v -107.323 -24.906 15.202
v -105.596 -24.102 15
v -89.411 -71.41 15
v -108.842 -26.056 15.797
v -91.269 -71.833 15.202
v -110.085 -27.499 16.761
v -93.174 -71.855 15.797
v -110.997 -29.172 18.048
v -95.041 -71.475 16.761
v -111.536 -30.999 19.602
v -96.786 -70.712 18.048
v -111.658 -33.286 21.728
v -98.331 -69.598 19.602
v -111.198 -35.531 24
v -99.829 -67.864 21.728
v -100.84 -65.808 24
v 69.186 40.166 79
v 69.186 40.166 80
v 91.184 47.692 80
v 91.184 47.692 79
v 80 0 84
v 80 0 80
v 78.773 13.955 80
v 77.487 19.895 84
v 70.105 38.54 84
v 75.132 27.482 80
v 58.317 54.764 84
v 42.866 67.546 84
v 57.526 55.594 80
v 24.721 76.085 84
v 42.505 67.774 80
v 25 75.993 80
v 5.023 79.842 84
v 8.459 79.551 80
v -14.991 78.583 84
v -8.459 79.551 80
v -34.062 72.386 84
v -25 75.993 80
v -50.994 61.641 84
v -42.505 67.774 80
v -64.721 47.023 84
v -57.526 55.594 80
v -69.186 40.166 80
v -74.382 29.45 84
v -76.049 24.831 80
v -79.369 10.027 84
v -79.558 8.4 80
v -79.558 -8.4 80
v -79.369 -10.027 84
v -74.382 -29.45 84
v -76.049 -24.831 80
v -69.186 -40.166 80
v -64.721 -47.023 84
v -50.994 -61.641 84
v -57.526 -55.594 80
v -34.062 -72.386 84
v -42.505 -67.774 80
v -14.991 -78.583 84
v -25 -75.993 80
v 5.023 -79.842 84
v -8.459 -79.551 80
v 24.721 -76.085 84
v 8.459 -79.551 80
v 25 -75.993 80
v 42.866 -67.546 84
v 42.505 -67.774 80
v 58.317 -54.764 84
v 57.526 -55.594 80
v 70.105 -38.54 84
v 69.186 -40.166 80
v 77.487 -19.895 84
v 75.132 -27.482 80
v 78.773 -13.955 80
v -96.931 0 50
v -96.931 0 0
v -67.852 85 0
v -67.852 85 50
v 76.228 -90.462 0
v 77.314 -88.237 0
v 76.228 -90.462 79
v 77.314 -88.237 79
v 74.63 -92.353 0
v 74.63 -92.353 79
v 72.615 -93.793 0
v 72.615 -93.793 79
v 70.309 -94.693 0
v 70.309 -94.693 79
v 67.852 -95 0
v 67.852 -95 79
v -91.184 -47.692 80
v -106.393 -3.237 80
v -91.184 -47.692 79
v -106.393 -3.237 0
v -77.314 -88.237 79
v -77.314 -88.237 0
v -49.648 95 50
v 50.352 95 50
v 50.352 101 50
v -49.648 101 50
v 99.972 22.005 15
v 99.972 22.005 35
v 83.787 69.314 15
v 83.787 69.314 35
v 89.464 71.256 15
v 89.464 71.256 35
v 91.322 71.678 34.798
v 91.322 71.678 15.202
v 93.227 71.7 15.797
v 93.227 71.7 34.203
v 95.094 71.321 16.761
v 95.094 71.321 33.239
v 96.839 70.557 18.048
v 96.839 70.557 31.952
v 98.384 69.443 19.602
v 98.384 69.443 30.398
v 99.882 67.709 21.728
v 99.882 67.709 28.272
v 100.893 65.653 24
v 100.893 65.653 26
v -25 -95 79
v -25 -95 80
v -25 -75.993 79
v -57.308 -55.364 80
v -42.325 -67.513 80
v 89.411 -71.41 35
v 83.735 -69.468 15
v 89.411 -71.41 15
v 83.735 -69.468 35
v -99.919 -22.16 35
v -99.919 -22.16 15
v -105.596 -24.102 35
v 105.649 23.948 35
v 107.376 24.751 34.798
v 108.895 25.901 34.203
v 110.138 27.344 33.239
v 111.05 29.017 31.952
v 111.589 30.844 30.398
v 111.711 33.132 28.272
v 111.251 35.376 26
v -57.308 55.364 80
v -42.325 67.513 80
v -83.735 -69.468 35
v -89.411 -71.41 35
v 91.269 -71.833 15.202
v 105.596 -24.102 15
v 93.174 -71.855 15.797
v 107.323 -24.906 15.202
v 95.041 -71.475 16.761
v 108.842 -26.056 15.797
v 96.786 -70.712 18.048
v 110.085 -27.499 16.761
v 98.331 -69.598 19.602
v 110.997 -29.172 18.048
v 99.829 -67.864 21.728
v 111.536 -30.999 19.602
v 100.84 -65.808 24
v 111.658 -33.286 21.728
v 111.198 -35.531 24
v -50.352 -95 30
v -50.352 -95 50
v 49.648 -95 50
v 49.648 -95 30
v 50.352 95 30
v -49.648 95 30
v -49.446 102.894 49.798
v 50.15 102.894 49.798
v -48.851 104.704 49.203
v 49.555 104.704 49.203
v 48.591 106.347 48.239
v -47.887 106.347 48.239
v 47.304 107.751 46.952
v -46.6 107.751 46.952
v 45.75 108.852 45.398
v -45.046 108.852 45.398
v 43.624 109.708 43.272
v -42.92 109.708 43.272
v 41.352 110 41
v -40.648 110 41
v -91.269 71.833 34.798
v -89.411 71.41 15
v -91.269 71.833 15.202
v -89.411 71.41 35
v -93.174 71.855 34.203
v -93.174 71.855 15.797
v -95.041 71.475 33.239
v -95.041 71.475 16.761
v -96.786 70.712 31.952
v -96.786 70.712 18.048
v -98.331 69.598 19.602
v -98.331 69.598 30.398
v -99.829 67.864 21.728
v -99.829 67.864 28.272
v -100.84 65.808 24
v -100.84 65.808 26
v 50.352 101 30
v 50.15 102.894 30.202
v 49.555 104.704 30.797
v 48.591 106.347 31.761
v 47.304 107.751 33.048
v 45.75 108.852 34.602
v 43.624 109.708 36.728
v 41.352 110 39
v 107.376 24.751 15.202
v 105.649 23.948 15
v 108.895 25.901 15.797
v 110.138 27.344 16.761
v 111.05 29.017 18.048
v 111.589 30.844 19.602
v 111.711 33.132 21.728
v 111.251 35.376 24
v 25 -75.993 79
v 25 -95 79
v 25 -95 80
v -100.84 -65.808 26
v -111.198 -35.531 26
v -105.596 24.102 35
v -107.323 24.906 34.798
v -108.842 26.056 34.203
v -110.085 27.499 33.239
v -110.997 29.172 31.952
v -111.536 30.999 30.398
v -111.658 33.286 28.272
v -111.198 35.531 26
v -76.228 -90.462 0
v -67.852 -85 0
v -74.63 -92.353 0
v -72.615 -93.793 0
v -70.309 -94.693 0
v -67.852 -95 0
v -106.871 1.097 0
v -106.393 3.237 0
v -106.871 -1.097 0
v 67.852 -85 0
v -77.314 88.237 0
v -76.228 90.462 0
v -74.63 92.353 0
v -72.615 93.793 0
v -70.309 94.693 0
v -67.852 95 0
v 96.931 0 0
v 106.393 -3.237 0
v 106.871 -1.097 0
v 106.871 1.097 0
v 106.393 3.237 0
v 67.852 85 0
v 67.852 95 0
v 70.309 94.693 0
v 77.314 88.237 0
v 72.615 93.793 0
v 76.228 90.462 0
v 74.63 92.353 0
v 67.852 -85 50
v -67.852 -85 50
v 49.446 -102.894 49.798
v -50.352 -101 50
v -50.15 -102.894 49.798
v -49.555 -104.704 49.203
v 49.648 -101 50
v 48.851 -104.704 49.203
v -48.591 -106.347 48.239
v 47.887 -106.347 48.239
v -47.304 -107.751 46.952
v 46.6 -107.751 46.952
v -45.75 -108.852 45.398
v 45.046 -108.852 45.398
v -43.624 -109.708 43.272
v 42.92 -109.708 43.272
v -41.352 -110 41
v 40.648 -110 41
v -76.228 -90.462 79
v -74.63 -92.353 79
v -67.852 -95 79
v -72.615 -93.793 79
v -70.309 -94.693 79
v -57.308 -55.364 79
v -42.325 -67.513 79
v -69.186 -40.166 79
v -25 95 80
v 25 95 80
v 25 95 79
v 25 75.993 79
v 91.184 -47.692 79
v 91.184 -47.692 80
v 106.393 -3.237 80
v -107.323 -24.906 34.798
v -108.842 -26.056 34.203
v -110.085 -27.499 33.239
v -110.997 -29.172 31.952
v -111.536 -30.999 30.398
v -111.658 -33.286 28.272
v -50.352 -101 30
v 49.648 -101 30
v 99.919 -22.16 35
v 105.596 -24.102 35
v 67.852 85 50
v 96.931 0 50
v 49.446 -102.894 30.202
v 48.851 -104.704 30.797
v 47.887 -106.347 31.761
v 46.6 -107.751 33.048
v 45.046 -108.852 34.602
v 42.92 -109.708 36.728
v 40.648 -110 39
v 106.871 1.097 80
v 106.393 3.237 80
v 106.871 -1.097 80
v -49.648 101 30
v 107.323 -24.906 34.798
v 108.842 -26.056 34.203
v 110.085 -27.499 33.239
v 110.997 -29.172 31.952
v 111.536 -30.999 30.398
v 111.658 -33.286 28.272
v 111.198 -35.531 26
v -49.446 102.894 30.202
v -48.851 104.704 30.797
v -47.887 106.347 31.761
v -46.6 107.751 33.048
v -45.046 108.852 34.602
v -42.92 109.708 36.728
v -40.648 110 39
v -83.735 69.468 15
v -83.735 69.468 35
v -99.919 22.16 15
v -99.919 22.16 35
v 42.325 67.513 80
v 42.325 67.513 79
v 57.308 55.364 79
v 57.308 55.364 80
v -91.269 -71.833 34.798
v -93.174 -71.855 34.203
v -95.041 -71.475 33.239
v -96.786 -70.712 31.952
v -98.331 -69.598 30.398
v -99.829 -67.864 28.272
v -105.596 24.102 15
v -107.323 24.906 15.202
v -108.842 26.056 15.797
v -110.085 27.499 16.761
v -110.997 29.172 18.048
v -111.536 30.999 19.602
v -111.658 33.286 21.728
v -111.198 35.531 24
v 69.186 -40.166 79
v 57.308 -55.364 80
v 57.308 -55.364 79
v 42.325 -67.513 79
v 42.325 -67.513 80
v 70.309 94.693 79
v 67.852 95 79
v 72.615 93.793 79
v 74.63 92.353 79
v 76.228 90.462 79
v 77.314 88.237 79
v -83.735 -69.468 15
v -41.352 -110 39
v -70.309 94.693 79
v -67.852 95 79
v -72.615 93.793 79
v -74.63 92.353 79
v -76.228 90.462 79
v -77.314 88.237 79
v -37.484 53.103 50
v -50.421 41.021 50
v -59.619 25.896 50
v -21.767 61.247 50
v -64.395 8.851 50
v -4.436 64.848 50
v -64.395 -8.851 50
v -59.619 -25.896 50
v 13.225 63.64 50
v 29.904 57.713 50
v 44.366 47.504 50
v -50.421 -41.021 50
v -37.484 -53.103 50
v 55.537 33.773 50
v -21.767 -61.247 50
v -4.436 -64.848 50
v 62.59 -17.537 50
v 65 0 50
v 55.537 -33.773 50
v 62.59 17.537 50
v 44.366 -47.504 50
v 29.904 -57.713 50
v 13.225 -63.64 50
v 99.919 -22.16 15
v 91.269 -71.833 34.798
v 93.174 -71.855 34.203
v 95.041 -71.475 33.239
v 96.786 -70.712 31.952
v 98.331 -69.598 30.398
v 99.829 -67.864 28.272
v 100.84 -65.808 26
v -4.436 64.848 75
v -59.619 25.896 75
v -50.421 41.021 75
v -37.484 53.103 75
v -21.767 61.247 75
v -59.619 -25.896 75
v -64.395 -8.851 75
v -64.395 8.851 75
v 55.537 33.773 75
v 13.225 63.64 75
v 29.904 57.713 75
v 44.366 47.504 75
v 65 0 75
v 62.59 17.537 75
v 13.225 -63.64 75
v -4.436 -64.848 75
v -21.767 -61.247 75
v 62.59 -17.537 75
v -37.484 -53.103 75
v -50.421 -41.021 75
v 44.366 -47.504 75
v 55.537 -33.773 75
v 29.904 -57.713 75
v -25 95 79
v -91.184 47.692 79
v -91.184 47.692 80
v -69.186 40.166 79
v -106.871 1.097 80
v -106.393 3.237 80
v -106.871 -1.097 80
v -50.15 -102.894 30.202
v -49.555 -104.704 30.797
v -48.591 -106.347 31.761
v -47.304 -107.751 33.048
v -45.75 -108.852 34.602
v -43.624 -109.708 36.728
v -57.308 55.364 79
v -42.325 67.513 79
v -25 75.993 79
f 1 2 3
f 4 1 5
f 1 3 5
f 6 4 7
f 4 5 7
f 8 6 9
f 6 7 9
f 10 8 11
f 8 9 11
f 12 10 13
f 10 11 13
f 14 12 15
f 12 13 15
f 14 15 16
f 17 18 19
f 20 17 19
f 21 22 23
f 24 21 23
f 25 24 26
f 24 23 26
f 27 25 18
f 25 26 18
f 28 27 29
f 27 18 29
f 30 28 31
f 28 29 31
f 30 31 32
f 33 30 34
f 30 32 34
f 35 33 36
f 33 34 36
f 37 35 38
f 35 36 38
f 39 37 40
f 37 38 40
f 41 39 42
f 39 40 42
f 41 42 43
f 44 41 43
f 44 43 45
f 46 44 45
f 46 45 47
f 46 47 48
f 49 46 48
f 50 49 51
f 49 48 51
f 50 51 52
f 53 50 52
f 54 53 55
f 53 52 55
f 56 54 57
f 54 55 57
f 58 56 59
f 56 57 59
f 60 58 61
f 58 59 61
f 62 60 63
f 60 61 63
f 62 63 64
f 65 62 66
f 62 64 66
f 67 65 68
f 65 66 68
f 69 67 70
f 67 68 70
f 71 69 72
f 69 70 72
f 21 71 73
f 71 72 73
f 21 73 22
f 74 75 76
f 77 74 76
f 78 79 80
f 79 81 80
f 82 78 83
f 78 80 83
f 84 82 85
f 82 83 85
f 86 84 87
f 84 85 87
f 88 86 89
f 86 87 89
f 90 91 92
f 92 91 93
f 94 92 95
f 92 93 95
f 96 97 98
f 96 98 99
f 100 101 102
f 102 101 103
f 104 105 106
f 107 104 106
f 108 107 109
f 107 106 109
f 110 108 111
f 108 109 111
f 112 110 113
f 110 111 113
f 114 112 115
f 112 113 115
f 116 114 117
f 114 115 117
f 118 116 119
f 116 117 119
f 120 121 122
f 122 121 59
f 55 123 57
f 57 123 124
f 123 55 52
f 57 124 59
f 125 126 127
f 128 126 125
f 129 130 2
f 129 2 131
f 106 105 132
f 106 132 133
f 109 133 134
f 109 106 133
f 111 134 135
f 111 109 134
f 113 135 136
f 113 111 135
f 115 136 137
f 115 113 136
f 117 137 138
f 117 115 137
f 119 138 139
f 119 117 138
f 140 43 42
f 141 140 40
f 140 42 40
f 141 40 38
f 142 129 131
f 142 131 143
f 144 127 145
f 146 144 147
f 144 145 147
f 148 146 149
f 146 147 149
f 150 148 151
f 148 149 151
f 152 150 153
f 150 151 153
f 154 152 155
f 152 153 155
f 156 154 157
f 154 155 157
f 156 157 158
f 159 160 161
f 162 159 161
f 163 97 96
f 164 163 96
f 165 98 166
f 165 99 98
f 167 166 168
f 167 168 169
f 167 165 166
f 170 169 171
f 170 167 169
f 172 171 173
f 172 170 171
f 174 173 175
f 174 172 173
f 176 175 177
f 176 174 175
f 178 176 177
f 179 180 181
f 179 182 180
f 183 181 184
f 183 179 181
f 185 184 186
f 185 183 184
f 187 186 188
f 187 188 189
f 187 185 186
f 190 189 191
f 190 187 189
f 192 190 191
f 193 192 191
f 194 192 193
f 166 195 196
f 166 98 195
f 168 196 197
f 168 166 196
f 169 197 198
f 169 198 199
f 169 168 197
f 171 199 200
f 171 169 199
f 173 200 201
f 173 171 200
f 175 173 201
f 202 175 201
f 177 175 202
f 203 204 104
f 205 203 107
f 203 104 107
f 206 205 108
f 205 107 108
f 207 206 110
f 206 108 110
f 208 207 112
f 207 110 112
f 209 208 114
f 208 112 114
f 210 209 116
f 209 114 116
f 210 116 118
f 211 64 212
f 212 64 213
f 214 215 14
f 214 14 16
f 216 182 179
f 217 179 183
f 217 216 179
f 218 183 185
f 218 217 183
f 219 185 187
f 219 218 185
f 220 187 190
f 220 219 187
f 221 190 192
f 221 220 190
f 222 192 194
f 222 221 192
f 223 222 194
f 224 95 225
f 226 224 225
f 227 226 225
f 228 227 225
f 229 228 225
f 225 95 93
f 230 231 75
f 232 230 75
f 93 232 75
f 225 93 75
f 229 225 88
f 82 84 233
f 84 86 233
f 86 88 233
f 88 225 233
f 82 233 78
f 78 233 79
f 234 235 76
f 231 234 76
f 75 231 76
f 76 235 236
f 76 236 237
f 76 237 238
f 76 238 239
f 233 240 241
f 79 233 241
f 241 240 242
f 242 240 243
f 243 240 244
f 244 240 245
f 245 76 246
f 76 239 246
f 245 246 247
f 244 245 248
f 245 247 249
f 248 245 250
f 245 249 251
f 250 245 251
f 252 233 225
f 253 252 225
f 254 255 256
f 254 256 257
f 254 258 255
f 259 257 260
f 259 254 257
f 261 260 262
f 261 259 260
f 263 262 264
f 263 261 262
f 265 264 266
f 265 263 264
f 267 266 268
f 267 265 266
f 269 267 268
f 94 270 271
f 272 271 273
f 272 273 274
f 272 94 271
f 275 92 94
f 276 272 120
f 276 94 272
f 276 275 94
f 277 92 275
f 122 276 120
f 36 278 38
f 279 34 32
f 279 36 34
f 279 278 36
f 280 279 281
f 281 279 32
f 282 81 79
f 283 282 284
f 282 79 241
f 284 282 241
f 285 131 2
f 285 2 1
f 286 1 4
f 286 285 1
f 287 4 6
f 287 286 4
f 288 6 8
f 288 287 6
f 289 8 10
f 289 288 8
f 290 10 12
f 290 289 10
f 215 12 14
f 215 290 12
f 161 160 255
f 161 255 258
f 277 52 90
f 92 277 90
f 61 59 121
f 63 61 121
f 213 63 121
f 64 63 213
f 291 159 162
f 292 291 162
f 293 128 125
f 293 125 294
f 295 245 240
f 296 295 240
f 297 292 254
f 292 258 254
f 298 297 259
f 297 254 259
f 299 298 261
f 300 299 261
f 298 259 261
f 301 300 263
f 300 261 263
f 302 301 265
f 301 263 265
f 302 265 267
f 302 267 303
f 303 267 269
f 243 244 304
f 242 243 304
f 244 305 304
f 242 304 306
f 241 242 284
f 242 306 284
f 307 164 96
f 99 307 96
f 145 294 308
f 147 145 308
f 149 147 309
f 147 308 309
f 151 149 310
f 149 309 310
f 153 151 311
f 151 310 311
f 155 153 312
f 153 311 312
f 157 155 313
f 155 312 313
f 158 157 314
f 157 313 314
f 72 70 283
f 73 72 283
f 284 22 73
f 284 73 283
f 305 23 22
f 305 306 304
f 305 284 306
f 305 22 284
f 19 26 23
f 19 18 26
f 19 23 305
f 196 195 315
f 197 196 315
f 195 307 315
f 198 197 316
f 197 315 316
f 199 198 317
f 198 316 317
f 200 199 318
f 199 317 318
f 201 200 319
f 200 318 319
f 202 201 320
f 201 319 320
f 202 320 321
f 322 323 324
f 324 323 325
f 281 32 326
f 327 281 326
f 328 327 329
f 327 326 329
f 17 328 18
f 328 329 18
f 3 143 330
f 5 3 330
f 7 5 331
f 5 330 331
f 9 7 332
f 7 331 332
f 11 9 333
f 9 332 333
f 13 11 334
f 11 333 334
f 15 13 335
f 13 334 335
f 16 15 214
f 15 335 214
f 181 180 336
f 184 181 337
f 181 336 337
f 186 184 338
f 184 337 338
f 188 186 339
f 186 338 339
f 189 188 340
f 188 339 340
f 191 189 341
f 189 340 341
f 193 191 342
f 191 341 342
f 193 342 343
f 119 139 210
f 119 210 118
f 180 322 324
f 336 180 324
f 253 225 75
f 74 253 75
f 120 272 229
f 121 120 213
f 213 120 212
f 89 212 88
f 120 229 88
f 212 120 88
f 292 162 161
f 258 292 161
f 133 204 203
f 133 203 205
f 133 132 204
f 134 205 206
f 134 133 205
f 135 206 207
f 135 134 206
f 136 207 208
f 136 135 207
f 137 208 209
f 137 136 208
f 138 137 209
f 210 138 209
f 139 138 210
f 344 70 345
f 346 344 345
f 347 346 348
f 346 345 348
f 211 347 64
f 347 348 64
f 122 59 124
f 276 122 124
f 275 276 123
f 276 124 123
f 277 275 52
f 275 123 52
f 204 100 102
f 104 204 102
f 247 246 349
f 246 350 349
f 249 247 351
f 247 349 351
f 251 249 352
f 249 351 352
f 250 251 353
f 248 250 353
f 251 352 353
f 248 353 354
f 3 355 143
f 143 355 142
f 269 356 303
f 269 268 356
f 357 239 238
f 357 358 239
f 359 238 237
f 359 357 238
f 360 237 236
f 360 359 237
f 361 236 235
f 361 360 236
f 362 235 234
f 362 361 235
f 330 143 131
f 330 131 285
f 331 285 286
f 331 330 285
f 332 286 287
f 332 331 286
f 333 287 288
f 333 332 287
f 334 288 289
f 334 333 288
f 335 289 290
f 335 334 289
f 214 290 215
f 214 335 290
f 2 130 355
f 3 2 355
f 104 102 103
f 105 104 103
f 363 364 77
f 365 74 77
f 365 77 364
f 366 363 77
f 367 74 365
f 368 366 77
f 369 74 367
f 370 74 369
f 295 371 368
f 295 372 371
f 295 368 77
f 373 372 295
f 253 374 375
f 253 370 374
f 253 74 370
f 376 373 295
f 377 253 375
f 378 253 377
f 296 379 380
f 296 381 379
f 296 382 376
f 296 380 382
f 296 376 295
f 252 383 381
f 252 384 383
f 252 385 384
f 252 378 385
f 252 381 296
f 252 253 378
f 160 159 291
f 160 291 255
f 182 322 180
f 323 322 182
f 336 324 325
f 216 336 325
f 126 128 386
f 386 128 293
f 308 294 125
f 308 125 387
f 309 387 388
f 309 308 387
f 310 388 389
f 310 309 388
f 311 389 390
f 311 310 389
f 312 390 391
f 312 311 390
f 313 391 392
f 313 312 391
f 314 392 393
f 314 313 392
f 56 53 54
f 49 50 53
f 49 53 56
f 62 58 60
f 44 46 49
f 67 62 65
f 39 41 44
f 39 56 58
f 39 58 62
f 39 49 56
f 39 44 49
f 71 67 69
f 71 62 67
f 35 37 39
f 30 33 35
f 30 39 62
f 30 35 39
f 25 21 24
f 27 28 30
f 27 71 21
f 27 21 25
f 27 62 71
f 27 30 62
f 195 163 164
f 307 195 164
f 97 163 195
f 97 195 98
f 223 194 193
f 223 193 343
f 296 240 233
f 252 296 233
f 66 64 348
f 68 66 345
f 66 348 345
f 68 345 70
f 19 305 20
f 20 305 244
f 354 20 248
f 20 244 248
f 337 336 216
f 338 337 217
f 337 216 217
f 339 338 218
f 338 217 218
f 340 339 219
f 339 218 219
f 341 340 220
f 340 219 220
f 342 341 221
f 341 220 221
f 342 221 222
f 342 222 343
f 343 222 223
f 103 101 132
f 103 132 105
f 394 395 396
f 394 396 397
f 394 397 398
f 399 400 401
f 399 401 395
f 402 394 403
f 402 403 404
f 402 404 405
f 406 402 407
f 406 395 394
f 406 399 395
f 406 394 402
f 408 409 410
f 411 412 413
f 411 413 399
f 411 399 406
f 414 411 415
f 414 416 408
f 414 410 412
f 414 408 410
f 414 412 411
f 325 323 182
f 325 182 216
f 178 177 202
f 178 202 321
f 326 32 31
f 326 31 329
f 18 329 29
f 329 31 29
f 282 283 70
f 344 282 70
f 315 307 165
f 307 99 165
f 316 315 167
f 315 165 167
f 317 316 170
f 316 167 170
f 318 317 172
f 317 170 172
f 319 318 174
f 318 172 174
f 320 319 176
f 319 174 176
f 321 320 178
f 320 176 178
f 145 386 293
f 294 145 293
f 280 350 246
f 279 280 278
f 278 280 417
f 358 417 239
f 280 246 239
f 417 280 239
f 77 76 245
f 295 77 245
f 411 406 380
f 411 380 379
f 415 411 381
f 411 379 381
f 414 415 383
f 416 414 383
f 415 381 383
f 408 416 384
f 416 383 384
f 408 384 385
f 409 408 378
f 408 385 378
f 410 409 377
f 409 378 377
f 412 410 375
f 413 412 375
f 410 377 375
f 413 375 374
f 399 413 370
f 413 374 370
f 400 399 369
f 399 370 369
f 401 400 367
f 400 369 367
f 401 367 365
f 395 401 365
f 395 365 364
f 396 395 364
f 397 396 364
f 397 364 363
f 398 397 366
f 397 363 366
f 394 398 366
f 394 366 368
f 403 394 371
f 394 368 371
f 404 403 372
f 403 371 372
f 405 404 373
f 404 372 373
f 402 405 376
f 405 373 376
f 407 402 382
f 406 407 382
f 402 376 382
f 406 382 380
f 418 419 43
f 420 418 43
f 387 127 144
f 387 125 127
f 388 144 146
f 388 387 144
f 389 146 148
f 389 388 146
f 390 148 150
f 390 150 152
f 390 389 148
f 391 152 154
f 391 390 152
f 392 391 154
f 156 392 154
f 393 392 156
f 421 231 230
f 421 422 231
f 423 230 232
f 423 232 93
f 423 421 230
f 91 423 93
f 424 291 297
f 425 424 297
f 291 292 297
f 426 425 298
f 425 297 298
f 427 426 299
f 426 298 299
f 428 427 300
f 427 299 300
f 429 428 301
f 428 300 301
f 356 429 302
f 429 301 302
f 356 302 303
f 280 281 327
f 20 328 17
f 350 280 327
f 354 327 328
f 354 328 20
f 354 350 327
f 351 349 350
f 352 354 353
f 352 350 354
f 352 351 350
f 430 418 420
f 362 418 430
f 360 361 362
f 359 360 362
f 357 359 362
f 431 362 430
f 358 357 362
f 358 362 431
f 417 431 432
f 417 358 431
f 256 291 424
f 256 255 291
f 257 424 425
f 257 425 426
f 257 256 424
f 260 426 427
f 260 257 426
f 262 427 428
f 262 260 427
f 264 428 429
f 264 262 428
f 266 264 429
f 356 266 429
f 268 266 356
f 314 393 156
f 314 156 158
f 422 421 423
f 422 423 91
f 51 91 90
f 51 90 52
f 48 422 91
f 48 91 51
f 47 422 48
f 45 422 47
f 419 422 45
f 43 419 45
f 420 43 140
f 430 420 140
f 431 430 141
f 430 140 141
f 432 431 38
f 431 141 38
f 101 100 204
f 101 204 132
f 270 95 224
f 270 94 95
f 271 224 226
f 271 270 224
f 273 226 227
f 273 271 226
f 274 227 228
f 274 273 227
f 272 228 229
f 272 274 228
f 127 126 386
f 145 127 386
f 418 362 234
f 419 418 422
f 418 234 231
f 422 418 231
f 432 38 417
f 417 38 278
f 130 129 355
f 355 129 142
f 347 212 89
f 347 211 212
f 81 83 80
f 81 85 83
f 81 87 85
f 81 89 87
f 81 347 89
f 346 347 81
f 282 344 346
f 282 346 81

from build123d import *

# Parameters (mm, degrees)
F1_DEPTH  = 80
F4_R      = 80
F5_DEPTH  = 4
F7_DEPTH  = 50
F8_R      = 65
F9_DEPTH  = 25
F11_DEPTH = 1
F13_R     = 10
F15_W     = 50
F15_H     = 20
F16_DEPTH = 15
F14_W     = 50
F14_H     = 20
F17_DEPTH = 15
F18_W     = 50
F18_H     = 20
F19_DEPTH = 15
F20_W     = 50
F20_H     = 20
F21_DEPTH = 15
F22_W     = 100
F22_H     = 20
F23_DEPTH = 15
F24_W     = 100
F24_H     = 20
F25_DEPTH = 15
F26_R     = 9
F26_2_R   = 9
F26_3_R   = 9
F26_4_R   = 9
F26_5_R   = 9
F26_6_R   = 9


# Not quite as in the source:
# - the program builds the solid bodies; features that only make, move or delete a surface that nothing else refers to are left out


with BuildPart() as f1:
    # F0 (on Top) → F1 (new body)
    with BuildSketch(Plane.XY):
        Polygon((75, 95), (0, 95), (0, 0), (107.5, 0), align=None)
        Polygon((0, 0), (0, 95), (-75, 95), (-107.5, 0), align=None)
        Polygon((107.5, 0), (0, 0), (0, -95), (75, -95), align=None)
        Polygon((0, -95), (0, 0), (-107.5, 0), (-75, -95), align=None)
    extrude(amount=F1_DEPTH)

    # F4 (on face) → F5 (join)
    with BuildSketch(Plane.XY.offset(80)):
        Circle(F4_R)
    extrude(amount=F5_DEPTH)

    # F6 (on face) → F7 (cut)
    with BuildSketch(Plane(origin=(0, 0, 0), x_dir=(1, 0, 0), z_dir=(0, 0, -1))):
        Polygon((67.8520601958, 85), (-67.8520601958, 85), (-96.9310075642, 0), (-67.8520601958, -85), (67.8520601958, -85), (96.9310075642, 0), align=None)
    extrude(amount=-F7_DEPTH, mode=Mode.SUBTRACT)

    # F8 (on face) → F9 (cut)
    with BuildSketch(Plane(origin=(0, 0, 50), x_dir=(1, 0, 0), z_dir=(0, 0, -1))):
        Circle(F8_R)
    extrude(amount=-F9_DEPTH, mode=Mode.SUBTRACT)

    # F10 (on face) → F11 (cut)
    with BuildSketch(Plane.XY.offset(80)):
        with BuildLine():
            Line((25, -95), (75, -95))
            Line((75, -95), (91.1843839531, -47.6918007523))
            Line((91.1843839531, -47.6918007523), (69.1859204708, -40.1660106136))
            ThreePointArc((69.1859204708, -40.1660106136), (50.1602708255, -61.8626277464), (25, -75.9934207679))
            Line((25, -75.9934207679), (25, -95))
        make_face()
        with BuildLine():
            Line((91.1843839531, 47.6918007523), (75, 95))
            Line((75, 95), (25, 95))
            Line((25, 95), (25, 75.9934207679))
            ThreePointArc((25, 75.9934207679), (50.1602708255, 61.8626277464), (69.1859204708, 40.1660106136))
            Line((69.1859204708, 40.1660106136), (91.1843839531, 47.6918007523))
        make_face()
        with BuildLine():
            Line((-25, 95), (-75, 95))
            Line((-75, 95), (-91.1843839531, 47.6918007523))
            Line((-91.1843839531, 47.6918007523), (-69.1859204708, 40.1660106136))
            ThreePointArc((-69.1859204708, 40.1660106136), (-50.1602708255, 61.8626277464), (-25, 75.9934207679))
            Line((-25, 75.9934207679), (-25, 95))
        make_face()
        with BuildLine():
            ThreePointArc((-25, -75.9934207679), (-50.1602708255, -61.8626277464), (-69.1859204708, -40.1660106136))
            Line((-69.1859204708, -40.1660106136), (-91.1843839531, -47.6918007523))
            Line((-91.1843839531, -47.6918007523), (-75, -95))
            Line((-75, -95), (-25, -95))
            Line((-25, -95), (-25, -75.9934207679))
        make_face()
    extrude(amount=-F11_DEPTH, mode=Mode.SUBTRACT)

    # F13
    f13_edges = [f1.edges().sort_by_distance(p)[0] for p in [
        (-75, -95, 39.5),
        (75, -95, 39.5),
        (107.5, 0, 40),
        (75, 95, 39.5),
        (-75, 95, 39.5),
        (-107.5, 0, 40),
    ]]
    fillet(f13_edges, radius=F13_R)


with BuildPart() as f16:
    # F15 (on face) → F16 (new body)
    with BuildSketch(Plane(origin=(-96.2368257905, 32.9231246125, 0), x_dir=(-0.3236876791, -0.946163985, 0), z_dir=(-0.946163985, 0.3236876791, 0))):
        with Locations((-13.6246271323, 25)):
            Rectangle(F15_W, F15_H)
    extrude(amount=F16_DEPTH)

    # F26#4
    f26_4_edges = [f16.edges().sort_by_distance(p)[0] for p in [
        (-114.111354, 27.015472, 25),
        (-106.019162, 50.669571, 35),
        (-97.92697, 74.323671, 25),
        (-106.019162, 50.669571, 15),
    ]]
    fillet(f26_4_edges, radius=F26_4_R)


with BuildPart() as f17:
    # F14 (on face) → F17 (new body)
    with BuildSketch(Plane(origin=(-96.2368257905, -32.9231246125, 0), x_dir=(0.3236876791, -0.946163985, 0), z_dir=(-0.946163985, -0.3236876791, 0))):
        with Locations((13.6246271323, 25)):
            Rectangle(F14_W, F14_H)
    extrude(amount=F17_DEPTH)

    # F26#3
    f26_3_edges = [f17.edges().sort_by_distance(p)[0] for p in [
        (-106.019162, -50.669571, 35),
        (-97.92697, -74.323671, 25),
        (-106.019162, -50.669571, 15),
        (-114.111354, -27.015472, 25),
    ]]
    fillet(f26_3_edges, radius=F26_3_R)


with BuildPart() as f19:
    # F18 (on face) → F19 (new body)
    with BuildSketch(Plane(origin=(96.2368257905, 32.9231246125, 0), x_dir=(-0.3236876791, 0.946163985, 0), z_dir=(0.946163985, 0.3236876791, 0))):
        with Locations((13.4610628366, 25)):
            Rectangle(F18_W, F18_H)
    extrude(amount=F19_DEPTH)

    # F26#2
    f26_2_edges = [f19.edges().sort_by_distance(p)[0] for p in [
        (106.072105, 50.514813, 35),
        (114.164297, 26.860713, 25),
        (106.072105, 50.514813, 15),
        (97.979913, 74.168912, 25),
    ]]
    fillet(f26_2_edges, radius=F26_2_R)


with BuildPart() as f21:
    # F20 (on face) → F21 (new body)
    with BuildSketch(Plane(origin=(96.2368257905, -32.9231246125, 0), x_dir=(0.3236876791, 0.946163985, 0), z_dir=(0.946163985, -0.3236876791, 0))):
        with Locations((-13.6246271323, 25)):
            Rectangle(F20_W, F20_H)
    extrude(amount=F21_DEPTH)

    # F26
    f26_edges = [f21.edges().sort_by_distance(p)[0] for p in [
        (106.019162, -50.669571, 35),
        (97.92697, -74.323671, 25),
        (106.019162, -50.669571, 15),
        (114.111354, -27.015472, 25),
    ]]
    fillet(f26_edges, radius=F26_R)


with BuildPart() as f23:
    # F22 (on face) → F23 (new body)
    with BuildSketch(Plane(origin=(0, 95, 0), x_dir=(-1, 0, 0), z_dir=(0, 1, 0))):
        with Locations((-0.3520601958, 40)):
            Rectangle(F22_W, F22_H)
    extrude(amount=F23_DEPTH)

    # F26#5
    f26_5_edges = [f23.edges().sort_by_distance(p)[0] for p in [
        (0.35206, 110, 50),
        (50.35206, 110, 40),
        (0.35206, 110, 30),
        (-49.64794, 110, 40),
    ]]
    fillet(f26_5_edges, radius=F26_5_R)


with BuildPart() as f25:
    # F24 (on face) → F25 (new body)
    with BuildSketch(Plane.XZ.offset(95)):
        with Locations((-0.3520601958, 40)):
            Rectangle(F24_W, F24_H)
    extrude(amount=F25_DEPTH)

    # F26#6
    f26_6_edges = [f25.edges().sort_by_distance(p)[0] for p in [
        (-0.35206, -110, 30),
        (49.64794, -110, 40),
        (-0.35206, -110, 50),
        (-50.35206, -110, 40),
    ]]
    fillet(f26_6_edges, radius=F26_6_R)


solid = Compound([f1.part, f16.part, f17.part, f19.part, f21.part, f23.part, f25.part])
